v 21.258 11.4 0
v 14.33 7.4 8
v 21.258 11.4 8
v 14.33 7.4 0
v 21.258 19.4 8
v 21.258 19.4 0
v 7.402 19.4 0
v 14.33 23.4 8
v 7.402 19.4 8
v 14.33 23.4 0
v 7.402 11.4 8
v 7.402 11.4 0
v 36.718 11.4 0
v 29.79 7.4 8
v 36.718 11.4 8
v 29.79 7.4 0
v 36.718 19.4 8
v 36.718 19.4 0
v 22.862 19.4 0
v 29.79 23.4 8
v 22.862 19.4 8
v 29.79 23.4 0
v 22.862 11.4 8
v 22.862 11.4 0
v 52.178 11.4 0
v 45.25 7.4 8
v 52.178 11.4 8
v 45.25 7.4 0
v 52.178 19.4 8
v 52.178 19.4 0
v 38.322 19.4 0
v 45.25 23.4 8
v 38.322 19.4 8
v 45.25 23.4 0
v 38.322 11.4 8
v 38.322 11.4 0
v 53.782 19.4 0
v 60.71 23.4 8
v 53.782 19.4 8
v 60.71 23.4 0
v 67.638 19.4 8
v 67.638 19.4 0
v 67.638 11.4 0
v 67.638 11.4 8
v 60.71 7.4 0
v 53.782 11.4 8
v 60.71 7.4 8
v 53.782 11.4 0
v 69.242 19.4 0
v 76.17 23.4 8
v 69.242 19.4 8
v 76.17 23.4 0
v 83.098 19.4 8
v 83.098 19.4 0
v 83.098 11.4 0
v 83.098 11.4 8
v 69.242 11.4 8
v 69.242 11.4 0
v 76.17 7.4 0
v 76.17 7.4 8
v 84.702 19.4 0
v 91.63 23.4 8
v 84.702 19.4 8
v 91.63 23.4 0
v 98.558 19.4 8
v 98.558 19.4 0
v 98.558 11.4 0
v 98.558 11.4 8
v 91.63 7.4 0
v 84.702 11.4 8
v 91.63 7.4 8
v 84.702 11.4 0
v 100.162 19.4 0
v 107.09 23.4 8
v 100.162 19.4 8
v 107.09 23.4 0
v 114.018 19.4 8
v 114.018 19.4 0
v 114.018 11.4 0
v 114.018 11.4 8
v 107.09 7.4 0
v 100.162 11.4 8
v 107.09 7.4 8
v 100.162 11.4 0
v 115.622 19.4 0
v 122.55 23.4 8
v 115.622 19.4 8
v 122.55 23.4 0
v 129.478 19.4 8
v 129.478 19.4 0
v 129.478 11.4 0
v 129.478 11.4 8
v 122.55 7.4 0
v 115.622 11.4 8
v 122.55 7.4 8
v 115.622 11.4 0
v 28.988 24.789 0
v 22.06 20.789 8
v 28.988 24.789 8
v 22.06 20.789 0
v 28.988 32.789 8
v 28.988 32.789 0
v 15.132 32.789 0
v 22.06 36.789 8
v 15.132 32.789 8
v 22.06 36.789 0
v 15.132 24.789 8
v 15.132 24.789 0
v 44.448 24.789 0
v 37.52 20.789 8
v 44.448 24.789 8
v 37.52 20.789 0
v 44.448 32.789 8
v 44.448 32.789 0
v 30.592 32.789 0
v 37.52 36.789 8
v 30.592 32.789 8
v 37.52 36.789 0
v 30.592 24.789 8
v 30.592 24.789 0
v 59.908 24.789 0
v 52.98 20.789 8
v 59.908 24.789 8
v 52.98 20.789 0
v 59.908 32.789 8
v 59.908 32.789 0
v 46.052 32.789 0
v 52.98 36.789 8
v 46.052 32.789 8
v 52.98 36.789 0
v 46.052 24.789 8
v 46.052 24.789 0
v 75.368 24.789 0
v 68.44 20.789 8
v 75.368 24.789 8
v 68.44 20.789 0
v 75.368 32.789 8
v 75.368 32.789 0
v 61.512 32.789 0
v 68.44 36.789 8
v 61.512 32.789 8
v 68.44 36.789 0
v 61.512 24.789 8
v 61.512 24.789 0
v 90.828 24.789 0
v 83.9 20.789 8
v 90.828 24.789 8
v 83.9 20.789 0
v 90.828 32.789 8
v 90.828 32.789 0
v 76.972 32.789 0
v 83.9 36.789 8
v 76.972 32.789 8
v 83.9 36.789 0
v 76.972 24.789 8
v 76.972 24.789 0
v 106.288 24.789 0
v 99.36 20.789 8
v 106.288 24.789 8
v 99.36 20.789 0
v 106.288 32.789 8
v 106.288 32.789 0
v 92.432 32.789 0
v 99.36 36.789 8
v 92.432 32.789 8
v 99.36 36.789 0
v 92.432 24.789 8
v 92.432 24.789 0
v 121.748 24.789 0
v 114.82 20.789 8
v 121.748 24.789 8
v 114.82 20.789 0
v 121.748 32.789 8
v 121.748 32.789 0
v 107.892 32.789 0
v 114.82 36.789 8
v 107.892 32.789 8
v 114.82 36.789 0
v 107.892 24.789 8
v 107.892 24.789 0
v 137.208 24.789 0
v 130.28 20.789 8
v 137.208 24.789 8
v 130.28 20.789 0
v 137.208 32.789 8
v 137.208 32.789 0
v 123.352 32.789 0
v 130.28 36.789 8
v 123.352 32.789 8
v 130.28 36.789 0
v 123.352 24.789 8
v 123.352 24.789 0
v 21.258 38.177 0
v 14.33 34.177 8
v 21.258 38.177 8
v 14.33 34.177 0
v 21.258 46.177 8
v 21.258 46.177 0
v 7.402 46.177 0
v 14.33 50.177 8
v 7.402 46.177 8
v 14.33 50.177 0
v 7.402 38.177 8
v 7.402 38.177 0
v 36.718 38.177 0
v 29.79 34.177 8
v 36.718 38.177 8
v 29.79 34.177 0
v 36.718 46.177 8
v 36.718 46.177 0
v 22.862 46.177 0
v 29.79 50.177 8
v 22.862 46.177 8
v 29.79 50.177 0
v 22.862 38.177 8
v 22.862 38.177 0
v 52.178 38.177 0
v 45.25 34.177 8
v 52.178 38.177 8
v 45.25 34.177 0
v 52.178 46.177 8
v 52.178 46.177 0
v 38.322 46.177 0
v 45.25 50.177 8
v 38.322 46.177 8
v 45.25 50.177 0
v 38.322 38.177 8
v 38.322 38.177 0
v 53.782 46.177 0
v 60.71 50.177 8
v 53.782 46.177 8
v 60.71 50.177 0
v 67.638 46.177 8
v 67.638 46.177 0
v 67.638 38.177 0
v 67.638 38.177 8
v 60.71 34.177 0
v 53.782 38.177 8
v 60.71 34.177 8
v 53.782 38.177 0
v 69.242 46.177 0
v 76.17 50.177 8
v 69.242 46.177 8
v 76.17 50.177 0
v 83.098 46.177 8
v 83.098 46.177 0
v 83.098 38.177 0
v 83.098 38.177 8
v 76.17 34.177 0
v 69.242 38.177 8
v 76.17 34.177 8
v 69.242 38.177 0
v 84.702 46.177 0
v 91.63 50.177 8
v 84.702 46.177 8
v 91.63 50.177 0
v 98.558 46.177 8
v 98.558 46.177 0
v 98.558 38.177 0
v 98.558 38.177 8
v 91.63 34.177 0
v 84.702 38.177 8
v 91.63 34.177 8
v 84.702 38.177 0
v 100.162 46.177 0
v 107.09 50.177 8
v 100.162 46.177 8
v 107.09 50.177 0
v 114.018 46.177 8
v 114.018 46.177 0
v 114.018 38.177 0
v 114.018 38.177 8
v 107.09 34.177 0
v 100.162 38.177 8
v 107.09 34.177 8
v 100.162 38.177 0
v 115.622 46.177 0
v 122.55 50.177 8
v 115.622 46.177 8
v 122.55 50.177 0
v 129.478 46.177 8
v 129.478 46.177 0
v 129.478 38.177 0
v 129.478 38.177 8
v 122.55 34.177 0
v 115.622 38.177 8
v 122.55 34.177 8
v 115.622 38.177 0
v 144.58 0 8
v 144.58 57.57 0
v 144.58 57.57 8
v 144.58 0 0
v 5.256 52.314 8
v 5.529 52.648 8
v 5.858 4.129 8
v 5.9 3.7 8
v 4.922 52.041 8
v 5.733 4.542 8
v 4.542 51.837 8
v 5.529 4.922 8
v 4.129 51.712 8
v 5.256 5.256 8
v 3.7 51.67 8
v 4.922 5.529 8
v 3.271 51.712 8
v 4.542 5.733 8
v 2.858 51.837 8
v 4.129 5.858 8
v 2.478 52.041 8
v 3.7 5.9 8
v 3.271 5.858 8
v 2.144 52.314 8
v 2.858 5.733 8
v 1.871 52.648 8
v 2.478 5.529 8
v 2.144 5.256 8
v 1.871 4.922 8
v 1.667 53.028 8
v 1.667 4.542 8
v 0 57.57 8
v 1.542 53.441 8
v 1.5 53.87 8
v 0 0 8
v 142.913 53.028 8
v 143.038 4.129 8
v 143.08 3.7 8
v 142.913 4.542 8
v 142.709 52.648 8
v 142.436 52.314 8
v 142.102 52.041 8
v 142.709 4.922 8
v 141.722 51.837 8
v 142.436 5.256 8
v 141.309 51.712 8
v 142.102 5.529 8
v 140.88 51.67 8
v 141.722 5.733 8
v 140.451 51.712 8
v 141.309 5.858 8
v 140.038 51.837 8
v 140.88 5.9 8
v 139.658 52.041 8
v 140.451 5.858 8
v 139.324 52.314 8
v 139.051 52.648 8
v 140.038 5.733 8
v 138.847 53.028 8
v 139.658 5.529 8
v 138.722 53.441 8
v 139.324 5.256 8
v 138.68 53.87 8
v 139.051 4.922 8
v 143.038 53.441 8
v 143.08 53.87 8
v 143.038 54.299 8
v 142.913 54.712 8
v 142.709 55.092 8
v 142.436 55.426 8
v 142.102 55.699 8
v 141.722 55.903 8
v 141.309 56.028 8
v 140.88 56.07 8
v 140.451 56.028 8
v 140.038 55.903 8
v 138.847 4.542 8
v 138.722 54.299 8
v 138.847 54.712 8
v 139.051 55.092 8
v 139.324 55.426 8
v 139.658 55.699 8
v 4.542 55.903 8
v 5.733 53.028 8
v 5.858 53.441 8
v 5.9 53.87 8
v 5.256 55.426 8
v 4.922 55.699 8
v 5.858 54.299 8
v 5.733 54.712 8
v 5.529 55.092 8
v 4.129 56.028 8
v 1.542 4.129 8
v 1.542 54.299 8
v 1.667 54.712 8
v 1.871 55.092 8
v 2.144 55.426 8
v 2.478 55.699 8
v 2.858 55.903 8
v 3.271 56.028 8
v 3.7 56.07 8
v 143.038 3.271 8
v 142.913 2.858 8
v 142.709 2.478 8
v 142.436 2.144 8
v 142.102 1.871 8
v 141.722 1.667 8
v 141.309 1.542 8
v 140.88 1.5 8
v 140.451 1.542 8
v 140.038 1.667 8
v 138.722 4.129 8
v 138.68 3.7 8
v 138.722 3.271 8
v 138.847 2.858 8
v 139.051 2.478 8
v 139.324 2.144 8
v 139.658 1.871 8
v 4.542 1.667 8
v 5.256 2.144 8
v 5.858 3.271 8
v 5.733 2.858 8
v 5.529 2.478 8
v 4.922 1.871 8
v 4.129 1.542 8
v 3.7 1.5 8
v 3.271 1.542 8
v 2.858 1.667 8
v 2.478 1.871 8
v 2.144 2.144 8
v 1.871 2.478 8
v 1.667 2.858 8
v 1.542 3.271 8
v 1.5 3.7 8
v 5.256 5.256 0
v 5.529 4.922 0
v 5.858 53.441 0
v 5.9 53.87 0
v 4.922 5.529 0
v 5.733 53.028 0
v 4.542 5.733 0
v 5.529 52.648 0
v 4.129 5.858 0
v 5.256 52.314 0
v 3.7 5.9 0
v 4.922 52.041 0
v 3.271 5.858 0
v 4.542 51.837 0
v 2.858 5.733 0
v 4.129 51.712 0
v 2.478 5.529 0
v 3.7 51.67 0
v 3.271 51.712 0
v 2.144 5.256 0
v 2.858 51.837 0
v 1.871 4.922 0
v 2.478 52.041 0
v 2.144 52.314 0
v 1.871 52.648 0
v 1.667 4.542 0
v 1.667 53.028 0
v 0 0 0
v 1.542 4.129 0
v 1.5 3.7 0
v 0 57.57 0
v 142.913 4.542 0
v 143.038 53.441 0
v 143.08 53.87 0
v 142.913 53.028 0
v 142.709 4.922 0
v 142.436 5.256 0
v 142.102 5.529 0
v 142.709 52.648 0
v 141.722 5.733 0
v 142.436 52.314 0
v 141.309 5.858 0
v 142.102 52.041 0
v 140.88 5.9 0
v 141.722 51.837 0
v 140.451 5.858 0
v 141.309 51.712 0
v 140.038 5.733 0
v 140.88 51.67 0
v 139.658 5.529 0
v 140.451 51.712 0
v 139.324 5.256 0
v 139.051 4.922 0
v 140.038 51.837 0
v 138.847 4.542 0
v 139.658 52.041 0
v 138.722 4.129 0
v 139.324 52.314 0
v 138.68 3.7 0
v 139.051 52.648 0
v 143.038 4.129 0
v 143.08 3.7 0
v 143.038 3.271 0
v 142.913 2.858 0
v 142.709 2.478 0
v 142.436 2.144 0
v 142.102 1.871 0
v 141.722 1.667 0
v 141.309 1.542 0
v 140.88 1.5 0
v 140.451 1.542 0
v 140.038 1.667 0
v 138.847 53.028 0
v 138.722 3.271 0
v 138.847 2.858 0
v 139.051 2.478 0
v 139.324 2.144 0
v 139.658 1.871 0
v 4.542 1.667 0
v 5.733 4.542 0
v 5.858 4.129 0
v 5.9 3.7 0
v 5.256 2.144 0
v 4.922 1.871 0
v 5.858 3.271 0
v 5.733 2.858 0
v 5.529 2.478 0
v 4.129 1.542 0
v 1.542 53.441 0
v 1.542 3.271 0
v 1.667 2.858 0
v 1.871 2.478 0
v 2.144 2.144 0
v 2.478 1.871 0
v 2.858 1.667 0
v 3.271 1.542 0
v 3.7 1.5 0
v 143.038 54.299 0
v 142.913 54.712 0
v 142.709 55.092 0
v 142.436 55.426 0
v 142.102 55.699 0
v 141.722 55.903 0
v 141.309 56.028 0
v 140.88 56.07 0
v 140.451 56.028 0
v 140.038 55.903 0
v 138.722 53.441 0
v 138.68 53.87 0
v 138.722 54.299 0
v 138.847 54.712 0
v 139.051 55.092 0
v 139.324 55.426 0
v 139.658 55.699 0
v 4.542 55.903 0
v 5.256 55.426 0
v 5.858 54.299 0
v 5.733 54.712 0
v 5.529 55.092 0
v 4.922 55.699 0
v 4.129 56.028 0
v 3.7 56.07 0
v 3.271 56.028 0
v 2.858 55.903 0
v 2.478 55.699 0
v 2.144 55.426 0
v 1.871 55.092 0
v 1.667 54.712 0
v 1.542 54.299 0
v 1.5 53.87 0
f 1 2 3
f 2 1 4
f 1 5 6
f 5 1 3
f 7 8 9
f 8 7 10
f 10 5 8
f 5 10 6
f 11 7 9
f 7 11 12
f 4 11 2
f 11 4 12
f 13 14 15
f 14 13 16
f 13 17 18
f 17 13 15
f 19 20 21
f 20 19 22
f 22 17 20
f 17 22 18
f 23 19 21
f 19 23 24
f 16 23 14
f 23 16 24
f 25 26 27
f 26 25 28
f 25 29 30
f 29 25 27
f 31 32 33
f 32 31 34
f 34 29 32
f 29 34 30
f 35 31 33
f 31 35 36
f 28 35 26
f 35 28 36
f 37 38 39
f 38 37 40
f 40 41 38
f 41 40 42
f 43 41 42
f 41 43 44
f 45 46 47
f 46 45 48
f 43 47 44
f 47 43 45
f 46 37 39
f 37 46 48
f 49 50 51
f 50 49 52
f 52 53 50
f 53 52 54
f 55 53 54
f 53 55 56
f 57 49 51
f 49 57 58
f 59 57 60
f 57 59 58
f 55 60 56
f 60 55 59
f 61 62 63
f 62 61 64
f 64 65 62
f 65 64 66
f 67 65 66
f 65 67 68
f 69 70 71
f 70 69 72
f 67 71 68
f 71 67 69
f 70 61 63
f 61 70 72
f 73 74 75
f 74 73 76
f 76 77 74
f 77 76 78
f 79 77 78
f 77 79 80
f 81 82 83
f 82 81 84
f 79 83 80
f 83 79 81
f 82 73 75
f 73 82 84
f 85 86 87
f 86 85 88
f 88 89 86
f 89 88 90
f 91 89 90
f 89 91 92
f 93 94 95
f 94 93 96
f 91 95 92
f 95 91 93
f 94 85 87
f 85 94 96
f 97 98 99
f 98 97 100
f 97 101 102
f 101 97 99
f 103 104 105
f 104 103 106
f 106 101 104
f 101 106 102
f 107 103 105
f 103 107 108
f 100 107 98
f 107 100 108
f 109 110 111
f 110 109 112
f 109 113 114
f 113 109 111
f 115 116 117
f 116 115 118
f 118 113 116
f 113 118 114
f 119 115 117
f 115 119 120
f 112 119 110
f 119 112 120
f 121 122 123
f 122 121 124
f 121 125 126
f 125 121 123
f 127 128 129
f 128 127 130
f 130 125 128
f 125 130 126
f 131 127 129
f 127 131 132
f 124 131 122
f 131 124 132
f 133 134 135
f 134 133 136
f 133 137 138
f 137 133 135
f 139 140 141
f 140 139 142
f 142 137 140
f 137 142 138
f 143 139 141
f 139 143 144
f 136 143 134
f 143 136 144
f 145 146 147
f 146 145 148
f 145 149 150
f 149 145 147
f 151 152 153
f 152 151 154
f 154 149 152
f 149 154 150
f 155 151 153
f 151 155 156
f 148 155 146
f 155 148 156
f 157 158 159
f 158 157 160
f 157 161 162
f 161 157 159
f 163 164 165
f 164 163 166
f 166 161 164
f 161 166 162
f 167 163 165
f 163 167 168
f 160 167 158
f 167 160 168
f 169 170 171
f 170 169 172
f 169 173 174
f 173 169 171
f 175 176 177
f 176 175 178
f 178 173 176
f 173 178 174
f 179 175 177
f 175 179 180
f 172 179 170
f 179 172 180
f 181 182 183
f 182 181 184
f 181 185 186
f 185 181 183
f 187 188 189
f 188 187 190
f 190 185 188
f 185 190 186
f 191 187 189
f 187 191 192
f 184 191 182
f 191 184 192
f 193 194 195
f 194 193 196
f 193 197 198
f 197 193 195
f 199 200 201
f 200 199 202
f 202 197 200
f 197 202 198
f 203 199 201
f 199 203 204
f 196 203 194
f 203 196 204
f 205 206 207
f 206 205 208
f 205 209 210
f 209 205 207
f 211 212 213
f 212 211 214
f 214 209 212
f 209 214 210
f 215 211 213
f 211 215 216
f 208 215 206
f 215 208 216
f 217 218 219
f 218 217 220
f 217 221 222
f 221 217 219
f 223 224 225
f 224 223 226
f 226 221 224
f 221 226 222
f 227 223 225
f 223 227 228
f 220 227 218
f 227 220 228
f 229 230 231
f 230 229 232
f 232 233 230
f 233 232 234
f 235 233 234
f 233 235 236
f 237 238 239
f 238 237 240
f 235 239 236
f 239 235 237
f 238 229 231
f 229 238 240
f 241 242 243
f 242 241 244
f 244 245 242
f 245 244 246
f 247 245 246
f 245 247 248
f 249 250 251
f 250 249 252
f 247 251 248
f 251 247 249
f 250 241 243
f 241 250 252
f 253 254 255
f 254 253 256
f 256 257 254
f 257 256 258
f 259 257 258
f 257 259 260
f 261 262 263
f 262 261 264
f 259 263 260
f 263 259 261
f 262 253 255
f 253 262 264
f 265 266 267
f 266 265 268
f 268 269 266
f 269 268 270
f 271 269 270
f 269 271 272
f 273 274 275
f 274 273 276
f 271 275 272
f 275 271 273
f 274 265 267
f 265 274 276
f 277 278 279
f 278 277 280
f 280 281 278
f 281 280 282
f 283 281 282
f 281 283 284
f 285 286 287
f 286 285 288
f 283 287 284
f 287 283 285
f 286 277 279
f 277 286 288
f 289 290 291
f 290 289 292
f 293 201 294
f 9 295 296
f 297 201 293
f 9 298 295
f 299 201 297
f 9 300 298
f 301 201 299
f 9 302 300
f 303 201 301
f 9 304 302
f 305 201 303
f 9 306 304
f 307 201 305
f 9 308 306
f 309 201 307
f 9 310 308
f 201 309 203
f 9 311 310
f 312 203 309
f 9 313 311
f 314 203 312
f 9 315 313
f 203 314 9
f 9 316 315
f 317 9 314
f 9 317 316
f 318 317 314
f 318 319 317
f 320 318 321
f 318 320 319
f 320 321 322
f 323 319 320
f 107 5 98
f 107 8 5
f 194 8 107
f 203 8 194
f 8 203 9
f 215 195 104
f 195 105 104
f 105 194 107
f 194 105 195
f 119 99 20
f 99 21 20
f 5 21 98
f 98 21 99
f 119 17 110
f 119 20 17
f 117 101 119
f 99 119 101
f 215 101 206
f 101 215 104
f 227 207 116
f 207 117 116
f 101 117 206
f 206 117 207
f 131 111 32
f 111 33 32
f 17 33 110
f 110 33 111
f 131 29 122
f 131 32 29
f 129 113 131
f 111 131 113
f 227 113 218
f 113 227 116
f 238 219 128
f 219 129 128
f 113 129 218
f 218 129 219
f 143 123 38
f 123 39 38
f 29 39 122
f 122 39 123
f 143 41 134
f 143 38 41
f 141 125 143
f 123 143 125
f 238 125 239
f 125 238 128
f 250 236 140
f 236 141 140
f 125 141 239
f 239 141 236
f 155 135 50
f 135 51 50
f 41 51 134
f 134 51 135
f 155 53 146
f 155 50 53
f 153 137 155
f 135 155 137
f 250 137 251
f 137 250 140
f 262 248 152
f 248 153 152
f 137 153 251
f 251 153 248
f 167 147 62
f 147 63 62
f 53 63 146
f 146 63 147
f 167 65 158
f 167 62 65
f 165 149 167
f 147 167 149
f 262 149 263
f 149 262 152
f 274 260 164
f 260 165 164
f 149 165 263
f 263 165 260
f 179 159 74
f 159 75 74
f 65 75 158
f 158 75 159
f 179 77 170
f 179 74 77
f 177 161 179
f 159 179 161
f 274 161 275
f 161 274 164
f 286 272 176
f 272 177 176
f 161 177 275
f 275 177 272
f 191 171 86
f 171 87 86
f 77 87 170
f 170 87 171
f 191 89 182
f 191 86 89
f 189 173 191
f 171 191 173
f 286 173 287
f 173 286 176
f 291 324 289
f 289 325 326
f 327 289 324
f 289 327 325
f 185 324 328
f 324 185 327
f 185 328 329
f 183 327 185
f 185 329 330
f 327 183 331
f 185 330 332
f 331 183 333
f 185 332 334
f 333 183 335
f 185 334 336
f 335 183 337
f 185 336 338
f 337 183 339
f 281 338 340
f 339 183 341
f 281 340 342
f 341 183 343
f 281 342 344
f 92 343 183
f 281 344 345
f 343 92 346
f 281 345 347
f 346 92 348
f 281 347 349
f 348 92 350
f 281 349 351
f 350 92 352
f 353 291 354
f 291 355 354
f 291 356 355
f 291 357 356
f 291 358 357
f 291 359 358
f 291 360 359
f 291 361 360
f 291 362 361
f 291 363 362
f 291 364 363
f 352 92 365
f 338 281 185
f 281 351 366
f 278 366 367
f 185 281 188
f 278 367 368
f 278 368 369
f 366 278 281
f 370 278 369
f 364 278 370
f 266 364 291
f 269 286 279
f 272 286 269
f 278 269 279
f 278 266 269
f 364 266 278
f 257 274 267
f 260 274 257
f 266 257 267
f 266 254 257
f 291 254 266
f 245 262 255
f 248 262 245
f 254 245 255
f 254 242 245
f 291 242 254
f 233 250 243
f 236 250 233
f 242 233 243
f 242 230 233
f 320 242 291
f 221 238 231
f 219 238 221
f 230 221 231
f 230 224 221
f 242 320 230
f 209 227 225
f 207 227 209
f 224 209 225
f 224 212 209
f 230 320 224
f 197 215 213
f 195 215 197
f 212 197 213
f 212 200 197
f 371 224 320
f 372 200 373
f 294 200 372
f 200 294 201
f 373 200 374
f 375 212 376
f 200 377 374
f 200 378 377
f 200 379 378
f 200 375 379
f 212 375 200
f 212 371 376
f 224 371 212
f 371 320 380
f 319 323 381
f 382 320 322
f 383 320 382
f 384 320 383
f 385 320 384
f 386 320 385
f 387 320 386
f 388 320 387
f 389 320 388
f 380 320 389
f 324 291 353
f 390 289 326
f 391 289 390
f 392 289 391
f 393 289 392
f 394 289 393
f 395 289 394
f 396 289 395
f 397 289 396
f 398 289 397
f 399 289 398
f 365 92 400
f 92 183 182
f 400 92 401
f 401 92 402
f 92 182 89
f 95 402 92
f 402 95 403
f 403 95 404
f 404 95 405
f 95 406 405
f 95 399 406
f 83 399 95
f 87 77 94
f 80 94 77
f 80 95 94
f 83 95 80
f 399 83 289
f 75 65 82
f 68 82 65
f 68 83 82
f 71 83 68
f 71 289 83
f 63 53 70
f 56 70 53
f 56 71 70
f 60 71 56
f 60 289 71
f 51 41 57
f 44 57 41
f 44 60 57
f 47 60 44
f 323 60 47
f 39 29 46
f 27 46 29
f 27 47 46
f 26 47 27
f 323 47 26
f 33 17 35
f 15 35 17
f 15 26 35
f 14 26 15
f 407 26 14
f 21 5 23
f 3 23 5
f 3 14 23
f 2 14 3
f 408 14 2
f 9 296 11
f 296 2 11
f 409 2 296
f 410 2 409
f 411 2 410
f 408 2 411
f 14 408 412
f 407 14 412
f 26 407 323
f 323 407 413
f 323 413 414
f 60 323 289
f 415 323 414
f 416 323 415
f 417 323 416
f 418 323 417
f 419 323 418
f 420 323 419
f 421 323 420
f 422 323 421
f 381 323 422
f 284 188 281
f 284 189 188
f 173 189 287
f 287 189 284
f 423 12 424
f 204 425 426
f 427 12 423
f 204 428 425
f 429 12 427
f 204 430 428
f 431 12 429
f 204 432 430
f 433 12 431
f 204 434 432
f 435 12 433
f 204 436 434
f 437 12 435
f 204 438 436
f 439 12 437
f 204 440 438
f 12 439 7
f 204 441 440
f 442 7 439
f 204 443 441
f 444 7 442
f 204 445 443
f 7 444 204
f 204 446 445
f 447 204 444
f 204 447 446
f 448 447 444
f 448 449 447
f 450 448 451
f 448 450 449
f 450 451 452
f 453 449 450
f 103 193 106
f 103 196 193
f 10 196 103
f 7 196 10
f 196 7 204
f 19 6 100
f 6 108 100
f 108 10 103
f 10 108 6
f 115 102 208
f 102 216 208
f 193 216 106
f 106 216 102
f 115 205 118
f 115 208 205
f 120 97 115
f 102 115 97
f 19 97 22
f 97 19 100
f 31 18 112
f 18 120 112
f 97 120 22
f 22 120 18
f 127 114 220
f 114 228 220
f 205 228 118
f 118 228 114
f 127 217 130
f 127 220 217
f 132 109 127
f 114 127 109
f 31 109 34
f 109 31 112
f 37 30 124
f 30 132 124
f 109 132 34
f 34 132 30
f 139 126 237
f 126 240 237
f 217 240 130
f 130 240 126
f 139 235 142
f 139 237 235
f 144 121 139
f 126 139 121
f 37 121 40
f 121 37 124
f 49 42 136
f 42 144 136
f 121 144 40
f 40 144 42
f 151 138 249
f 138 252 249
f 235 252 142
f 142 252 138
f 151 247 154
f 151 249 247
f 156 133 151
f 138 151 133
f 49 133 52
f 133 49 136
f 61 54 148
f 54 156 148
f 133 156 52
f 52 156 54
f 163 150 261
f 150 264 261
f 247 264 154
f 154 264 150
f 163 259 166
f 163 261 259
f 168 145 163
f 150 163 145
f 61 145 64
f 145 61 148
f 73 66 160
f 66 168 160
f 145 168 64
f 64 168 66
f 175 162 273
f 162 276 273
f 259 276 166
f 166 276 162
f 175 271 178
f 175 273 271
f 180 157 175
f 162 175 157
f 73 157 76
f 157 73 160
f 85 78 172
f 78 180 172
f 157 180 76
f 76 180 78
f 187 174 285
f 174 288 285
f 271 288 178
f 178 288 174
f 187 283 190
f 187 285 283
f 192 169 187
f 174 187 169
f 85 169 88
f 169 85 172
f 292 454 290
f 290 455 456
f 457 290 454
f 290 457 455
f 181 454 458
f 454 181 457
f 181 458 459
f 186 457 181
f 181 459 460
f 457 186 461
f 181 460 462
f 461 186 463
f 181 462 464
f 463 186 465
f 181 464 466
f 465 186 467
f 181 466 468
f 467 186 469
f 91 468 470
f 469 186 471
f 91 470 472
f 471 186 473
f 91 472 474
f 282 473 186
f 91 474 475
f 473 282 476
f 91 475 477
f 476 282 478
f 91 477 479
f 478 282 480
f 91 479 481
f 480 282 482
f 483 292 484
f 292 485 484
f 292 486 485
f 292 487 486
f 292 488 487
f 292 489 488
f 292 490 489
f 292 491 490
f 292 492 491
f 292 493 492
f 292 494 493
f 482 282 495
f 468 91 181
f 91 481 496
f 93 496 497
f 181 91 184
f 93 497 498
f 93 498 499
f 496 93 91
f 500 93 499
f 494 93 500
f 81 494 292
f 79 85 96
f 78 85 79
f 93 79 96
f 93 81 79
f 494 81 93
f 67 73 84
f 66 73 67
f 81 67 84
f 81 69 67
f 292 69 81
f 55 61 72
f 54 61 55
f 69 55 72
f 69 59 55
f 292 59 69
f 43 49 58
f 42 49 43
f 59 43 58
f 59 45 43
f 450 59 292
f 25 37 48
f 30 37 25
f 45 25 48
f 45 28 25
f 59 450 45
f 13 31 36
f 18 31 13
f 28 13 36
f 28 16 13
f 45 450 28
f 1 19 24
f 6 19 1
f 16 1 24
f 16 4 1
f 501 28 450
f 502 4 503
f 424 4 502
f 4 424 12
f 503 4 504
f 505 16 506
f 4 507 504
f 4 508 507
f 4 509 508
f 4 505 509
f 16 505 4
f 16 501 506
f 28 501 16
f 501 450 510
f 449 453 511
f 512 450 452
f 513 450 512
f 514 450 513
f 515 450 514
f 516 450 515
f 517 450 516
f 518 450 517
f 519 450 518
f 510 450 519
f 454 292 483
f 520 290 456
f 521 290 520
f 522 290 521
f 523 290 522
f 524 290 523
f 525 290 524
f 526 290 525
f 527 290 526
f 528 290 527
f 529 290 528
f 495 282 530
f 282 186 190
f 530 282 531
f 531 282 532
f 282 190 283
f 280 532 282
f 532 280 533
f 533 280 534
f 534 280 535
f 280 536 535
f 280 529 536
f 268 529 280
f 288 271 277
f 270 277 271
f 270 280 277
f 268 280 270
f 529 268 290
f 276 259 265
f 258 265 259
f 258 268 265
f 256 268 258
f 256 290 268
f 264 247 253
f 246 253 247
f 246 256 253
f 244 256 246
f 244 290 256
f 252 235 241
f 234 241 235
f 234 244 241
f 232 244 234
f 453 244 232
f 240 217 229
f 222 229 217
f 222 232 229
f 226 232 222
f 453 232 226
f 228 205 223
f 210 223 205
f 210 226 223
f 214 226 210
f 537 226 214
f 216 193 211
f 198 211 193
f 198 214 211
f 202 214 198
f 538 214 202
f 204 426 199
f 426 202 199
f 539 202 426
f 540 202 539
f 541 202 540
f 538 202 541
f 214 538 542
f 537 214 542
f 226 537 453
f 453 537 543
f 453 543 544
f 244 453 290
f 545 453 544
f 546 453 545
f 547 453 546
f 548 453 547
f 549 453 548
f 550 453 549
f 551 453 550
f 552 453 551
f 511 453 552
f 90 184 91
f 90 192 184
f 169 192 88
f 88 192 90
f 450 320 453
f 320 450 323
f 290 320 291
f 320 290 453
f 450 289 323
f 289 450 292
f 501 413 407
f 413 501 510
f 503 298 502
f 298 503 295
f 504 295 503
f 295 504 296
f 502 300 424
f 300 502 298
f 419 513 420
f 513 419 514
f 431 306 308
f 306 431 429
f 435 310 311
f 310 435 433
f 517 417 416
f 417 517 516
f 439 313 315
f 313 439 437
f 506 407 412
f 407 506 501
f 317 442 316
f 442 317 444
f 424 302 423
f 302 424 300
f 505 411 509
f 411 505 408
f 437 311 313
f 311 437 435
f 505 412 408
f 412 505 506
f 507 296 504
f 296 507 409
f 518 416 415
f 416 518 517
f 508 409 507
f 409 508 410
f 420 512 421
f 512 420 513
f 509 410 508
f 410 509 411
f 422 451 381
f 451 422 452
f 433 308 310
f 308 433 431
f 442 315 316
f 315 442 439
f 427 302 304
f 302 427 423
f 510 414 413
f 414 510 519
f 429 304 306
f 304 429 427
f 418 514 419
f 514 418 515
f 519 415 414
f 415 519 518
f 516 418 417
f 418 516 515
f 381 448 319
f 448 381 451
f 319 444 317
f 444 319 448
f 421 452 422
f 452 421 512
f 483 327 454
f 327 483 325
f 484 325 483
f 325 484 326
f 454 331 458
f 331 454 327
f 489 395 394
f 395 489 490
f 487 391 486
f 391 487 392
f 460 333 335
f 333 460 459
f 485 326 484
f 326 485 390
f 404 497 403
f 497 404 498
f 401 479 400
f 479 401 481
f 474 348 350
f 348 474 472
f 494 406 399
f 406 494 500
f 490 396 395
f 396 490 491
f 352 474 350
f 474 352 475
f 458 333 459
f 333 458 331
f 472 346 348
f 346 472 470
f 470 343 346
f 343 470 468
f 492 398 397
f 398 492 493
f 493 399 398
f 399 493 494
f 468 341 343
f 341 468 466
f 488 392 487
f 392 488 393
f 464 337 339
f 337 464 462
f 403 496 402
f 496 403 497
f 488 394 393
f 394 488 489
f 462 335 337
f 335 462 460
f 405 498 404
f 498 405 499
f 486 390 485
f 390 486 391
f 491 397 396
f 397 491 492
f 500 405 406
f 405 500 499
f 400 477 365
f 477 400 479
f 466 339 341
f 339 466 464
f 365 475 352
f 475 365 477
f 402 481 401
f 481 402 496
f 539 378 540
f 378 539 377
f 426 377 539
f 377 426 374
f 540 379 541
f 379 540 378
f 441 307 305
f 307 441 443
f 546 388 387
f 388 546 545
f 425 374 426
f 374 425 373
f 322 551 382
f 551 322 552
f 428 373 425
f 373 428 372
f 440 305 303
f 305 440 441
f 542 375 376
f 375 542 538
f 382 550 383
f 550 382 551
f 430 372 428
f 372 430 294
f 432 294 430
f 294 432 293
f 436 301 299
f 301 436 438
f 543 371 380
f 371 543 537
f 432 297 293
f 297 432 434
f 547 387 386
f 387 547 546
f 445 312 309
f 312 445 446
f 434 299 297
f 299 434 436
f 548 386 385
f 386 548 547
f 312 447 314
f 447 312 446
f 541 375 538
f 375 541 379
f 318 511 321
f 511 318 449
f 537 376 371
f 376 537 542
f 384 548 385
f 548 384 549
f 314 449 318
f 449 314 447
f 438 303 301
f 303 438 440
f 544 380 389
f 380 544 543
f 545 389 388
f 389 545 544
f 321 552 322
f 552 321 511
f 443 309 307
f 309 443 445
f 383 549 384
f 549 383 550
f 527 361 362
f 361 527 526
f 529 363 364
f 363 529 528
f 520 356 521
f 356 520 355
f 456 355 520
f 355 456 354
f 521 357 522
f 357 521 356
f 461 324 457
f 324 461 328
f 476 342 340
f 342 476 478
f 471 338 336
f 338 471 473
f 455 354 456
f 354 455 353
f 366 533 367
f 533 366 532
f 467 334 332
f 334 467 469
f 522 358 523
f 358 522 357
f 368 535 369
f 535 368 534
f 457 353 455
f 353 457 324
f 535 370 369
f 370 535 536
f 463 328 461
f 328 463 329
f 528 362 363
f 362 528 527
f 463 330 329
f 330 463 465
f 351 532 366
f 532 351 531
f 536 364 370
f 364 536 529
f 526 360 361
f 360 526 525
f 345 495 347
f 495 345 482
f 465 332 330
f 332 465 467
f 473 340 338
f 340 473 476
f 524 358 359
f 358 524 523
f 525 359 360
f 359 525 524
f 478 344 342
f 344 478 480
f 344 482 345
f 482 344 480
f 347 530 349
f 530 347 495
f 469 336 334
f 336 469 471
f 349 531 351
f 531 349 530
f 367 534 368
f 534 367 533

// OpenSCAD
$fn = 32;

// ----------------------------------------------------------------------
// Honeycomb panel: 144.58 x 57.57 mm, 24 cells of 16 mm
// ----------------------------------------------------------------------

// --- parameters (mm) ---
panel_w = 144.58;         // panel width
panel_d = 57.57;          // panel depth
thick = 8;                // panel thickness
cell_r = 8;               // hex cell circumradius
pitch = 15.46;            // hex cell pitch (centre to centre)
web = 1.6;                // web between the cells
columns = 8;              // columns of cells
rows = 3;                 // rows of cells
cell_count = 24;          // total cells
shift_x = 14.33;          // first cell offset in x
shift_y = 15.4;           // first cell offset in y
mount_d = 4.4;            // corner mounting holes
hole_off = 3.7;           // mounting hole offset from the corners

difference() {
  union() {
    cube([panel_w, panel_d, thick]);
  }
  /* hexagonal cells, point-up, cut right through the plate */
  for (row = [0 : rows - 1]) {
    for (col = [0 : columns - 1]) {
      translate([shift_x + col * pitch + (row % 2) * pitch / 2, shift_y + row * pitch * 0.866025, -2.5]) rotate([0, 0, 30]) cylinder(h = thick + 5, d = 2 * cell_r, $fn = 6);
    }
  }
  /* corner mounting holes, clear of the outer cell web */
  translate([3.7, 3.7, -2.5]) cylinder(h = thick + 5, d = mount_d);
  translate([140.88, 3.7, -2.5]) cylinder(h = thick + 5, d = mount_d);
  translate([3.7, 53.87, -2.5]) cylinder(h = thick + 5, d = mount_d);
  translate([140.88, 53.87, -2.5]) cylinder(h = thick + 5, d = mount_d);
}
